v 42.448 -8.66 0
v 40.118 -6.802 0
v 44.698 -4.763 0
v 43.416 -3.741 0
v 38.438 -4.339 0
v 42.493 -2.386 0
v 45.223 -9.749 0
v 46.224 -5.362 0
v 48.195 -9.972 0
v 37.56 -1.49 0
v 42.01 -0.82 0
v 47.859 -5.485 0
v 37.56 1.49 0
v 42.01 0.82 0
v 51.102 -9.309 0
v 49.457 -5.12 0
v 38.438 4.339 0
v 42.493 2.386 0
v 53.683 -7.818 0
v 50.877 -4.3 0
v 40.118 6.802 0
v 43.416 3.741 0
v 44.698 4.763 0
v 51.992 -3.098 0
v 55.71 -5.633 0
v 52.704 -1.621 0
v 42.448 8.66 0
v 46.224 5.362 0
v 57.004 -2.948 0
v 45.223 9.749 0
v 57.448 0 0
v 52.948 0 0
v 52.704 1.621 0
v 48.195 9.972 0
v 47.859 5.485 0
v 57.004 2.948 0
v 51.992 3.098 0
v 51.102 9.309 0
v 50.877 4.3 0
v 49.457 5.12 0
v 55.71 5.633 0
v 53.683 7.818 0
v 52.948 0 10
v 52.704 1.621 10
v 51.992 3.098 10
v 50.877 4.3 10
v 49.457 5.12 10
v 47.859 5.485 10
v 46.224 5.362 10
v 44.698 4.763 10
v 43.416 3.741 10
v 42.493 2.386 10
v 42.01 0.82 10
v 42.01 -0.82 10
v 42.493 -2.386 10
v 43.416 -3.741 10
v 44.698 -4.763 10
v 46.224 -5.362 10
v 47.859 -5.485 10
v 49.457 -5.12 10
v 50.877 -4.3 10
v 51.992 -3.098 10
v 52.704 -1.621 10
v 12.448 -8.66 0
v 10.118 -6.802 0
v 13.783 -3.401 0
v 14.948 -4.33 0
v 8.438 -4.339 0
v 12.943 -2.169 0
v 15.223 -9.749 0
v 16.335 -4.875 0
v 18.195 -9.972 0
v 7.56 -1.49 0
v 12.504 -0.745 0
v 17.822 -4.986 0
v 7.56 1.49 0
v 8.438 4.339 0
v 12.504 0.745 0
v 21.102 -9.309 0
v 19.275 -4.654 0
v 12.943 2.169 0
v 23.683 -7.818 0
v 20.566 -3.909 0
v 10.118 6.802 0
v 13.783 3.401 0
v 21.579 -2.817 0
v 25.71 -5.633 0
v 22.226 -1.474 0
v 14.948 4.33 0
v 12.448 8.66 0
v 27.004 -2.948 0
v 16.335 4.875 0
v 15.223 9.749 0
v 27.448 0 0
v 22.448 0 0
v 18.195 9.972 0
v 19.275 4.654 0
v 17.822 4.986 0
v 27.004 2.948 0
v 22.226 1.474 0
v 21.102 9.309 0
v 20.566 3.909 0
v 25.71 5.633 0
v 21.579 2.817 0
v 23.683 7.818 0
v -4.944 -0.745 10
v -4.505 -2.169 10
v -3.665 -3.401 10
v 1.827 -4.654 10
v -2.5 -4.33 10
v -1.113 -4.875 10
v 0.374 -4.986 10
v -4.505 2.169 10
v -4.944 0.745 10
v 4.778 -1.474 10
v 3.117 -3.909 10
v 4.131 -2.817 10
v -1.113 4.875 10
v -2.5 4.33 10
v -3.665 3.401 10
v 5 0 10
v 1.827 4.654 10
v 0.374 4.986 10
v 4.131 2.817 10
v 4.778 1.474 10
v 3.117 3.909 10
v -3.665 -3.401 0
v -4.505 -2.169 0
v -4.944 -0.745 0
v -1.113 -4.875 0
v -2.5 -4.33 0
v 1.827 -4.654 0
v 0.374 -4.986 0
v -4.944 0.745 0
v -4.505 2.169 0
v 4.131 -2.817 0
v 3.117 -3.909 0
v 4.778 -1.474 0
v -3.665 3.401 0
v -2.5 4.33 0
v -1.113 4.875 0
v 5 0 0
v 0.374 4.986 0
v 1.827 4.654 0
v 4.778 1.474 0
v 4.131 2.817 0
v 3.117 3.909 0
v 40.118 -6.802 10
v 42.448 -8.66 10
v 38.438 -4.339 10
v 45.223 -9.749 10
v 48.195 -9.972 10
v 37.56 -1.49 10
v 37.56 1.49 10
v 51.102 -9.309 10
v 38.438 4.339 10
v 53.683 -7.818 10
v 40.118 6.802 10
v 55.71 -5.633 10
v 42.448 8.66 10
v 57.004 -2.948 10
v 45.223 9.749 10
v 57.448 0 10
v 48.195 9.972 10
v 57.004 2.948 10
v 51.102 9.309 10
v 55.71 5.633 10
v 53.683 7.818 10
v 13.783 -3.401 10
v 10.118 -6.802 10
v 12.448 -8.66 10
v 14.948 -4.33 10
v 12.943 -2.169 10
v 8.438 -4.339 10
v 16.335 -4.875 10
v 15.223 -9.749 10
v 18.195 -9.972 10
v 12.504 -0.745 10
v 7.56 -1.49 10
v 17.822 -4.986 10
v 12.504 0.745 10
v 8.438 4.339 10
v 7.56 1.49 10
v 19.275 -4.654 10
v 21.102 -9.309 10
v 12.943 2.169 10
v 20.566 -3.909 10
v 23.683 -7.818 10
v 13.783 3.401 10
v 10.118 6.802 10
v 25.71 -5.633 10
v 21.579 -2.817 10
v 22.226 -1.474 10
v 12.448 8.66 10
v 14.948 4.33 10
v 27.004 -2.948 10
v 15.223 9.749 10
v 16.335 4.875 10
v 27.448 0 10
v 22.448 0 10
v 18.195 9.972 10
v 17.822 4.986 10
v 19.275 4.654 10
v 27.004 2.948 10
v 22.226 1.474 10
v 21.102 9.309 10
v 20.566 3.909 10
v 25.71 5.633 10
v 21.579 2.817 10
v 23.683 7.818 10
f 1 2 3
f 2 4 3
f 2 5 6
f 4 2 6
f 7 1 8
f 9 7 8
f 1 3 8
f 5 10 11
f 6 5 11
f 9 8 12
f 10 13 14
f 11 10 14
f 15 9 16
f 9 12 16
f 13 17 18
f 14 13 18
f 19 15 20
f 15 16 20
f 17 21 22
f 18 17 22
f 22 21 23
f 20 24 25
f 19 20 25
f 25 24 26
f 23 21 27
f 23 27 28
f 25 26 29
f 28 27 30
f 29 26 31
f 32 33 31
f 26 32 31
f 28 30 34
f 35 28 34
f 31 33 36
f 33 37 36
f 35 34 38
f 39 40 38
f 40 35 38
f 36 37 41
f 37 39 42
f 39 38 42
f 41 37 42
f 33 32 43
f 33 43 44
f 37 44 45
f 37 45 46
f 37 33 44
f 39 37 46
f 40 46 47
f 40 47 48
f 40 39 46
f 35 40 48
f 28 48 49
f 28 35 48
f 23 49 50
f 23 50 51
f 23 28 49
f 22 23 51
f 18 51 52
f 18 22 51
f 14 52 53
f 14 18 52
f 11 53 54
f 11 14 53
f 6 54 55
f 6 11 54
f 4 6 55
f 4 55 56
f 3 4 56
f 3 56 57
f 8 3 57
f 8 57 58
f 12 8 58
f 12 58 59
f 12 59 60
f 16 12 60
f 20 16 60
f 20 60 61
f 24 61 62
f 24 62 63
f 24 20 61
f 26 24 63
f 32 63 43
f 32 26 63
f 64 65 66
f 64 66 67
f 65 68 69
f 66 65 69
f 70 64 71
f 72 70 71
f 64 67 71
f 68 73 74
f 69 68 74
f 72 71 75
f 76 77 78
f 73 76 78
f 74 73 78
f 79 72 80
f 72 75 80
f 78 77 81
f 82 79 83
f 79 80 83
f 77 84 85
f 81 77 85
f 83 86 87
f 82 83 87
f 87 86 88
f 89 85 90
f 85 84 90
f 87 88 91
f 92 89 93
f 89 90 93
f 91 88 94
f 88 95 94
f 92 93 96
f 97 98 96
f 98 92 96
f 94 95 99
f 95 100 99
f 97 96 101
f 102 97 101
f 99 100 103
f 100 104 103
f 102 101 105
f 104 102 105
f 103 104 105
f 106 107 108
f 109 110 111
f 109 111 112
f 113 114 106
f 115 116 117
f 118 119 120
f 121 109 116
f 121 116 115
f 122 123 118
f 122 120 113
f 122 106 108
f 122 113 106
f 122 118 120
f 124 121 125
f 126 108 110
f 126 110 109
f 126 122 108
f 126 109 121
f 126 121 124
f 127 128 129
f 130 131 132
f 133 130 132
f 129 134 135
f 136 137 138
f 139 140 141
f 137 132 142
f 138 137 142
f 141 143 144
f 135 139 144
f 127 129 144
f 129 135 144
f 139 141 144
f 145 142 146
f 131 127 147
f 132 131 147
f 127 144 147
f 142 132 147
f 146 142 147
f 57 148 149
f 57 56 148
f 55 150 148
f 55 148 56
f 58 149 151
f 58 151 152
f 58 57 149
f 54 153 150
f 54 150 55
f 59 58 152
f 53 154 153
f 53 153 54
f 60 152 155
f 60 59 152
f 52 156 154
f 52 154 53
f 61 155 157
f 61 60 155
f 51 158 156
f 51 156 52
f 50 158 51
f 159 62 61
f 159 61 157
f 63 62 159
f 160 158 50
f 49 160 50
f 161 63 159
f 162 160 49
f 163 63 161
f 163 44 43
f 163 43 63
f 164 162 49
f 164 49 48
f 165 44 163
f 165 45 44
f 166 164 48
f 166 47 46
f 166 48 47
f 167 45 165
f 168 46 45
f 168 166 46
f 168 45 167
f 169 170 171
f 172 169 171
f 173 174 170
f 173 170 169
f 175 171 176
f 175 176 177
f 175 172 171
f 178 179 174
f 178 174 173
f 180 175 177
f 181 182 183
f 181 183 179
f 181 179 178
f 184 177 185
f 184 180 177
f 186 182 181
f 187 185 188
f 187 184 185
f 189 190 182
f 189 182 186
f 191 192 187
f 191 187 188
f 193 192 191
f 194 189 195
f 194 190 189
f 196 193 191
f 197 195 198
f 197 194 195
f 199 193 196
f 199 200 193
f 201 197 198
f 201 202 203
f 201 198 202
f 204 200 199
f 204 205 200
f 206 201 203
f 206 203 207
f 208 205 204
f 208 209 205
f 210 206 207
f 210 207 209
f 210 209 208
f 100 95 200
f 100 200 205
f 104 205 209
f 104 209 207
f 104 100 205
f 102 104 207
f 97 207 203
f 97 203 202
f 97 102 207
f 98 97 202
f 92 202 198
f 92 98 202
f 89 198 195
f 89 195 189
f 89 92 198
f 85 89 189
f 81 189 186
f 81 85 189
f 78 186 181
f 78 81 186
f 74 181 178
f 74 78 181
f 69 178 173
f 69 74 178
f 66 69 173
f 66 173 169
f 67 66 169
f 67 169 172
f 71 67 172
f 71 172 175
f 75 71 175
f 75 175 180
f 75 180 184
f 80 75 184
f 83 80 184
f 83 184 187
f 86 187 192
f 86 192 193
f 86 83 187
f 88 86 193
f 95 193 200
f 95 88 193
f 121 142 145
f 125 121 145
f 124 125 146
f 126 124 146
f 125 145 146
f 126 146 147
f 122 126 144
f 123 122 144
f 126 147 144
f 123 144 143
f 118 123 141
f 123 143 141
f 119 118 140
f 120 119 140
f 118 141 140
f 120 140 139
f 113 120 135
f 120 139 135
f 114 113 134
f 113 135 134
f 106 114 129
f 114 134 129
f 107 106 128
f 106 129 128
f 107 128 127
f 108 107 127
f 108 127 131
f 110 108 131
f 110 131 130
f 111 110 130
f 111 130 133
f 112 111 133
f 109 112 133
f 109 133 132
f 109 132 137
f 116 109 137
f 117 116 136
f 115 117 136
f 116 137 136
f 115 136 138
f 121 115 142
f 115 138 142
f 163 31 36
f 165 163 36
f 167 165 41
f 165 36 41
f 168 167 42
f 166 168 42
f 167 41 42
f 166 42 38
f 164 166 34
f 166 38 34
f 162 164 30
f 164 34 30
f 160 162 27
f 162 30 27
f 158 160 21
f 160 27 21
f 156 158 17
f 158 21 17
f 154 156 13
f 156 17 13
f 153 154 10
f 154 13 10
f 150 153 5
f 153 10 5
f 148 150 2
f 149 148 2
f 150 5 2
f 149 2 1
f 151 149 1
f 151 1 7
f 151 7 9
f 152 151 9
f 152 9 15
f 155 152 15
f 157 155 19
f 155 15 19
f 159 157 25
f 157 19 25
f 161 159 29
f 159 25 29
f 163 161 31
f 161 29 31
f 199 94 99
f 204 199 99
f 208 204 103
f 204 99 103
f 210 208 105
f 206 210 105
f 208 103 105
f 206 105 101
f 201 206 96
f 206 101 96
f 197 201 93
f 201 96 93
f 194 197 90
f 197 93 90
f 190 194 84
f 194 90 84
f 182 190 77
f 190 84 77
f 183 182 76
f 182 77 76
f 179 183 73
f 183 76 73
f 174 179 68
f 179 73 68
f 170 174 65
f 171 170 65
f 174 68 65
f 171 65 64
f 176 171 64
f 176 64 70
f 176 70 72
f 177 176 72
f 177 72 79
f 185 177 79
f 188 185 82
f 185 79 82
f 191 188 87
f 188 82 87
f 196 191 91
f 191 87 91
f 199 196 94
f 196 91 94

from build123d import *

# Parameters (mm, degrees)
F1_R     = 5
F2_DEPTH = 10
F3_R     = 10
F3_R_2   = 5
F4_DEPTH = 10
F5_R     = 10
F5_R_2   = 5.5
F6_DEPTH = 10


with BuildPart() as f2:
    # F1 (on Top) → F2 (new body)
    with BuildSketch(Plane.XY):
        Circle(F1_R)
    extrude(amount=F2_DEPTH)


with BuildPart() as f4:
    # F3 (on Top) → F4 (new body)
    with BuildSketch(Plane.XY):
        with Locations((17.4480897933, 0)):
            Circle(F3_R)
        with Locations((17.4480897933, 0)):
            Circle(F3_R_2, mode=Mode.SUBTRACT)
    extrude(amount=F4_DEPTH)


with BuildPart() as f6:
    # F5 (on Top) → F6 (new body)
    with BuildSketch(Plane.XY):
        with Locations((47.4480897933, 0)):
            Circle(F5_R)
        with Locations((47.4480897933, 0)):
            Circle(F5_R_2, mode=Mode.SUBTRACT)
    extrude(amount=F6_DEPTH)


solid = Compound([f2.part, f4.part, f6.part])
